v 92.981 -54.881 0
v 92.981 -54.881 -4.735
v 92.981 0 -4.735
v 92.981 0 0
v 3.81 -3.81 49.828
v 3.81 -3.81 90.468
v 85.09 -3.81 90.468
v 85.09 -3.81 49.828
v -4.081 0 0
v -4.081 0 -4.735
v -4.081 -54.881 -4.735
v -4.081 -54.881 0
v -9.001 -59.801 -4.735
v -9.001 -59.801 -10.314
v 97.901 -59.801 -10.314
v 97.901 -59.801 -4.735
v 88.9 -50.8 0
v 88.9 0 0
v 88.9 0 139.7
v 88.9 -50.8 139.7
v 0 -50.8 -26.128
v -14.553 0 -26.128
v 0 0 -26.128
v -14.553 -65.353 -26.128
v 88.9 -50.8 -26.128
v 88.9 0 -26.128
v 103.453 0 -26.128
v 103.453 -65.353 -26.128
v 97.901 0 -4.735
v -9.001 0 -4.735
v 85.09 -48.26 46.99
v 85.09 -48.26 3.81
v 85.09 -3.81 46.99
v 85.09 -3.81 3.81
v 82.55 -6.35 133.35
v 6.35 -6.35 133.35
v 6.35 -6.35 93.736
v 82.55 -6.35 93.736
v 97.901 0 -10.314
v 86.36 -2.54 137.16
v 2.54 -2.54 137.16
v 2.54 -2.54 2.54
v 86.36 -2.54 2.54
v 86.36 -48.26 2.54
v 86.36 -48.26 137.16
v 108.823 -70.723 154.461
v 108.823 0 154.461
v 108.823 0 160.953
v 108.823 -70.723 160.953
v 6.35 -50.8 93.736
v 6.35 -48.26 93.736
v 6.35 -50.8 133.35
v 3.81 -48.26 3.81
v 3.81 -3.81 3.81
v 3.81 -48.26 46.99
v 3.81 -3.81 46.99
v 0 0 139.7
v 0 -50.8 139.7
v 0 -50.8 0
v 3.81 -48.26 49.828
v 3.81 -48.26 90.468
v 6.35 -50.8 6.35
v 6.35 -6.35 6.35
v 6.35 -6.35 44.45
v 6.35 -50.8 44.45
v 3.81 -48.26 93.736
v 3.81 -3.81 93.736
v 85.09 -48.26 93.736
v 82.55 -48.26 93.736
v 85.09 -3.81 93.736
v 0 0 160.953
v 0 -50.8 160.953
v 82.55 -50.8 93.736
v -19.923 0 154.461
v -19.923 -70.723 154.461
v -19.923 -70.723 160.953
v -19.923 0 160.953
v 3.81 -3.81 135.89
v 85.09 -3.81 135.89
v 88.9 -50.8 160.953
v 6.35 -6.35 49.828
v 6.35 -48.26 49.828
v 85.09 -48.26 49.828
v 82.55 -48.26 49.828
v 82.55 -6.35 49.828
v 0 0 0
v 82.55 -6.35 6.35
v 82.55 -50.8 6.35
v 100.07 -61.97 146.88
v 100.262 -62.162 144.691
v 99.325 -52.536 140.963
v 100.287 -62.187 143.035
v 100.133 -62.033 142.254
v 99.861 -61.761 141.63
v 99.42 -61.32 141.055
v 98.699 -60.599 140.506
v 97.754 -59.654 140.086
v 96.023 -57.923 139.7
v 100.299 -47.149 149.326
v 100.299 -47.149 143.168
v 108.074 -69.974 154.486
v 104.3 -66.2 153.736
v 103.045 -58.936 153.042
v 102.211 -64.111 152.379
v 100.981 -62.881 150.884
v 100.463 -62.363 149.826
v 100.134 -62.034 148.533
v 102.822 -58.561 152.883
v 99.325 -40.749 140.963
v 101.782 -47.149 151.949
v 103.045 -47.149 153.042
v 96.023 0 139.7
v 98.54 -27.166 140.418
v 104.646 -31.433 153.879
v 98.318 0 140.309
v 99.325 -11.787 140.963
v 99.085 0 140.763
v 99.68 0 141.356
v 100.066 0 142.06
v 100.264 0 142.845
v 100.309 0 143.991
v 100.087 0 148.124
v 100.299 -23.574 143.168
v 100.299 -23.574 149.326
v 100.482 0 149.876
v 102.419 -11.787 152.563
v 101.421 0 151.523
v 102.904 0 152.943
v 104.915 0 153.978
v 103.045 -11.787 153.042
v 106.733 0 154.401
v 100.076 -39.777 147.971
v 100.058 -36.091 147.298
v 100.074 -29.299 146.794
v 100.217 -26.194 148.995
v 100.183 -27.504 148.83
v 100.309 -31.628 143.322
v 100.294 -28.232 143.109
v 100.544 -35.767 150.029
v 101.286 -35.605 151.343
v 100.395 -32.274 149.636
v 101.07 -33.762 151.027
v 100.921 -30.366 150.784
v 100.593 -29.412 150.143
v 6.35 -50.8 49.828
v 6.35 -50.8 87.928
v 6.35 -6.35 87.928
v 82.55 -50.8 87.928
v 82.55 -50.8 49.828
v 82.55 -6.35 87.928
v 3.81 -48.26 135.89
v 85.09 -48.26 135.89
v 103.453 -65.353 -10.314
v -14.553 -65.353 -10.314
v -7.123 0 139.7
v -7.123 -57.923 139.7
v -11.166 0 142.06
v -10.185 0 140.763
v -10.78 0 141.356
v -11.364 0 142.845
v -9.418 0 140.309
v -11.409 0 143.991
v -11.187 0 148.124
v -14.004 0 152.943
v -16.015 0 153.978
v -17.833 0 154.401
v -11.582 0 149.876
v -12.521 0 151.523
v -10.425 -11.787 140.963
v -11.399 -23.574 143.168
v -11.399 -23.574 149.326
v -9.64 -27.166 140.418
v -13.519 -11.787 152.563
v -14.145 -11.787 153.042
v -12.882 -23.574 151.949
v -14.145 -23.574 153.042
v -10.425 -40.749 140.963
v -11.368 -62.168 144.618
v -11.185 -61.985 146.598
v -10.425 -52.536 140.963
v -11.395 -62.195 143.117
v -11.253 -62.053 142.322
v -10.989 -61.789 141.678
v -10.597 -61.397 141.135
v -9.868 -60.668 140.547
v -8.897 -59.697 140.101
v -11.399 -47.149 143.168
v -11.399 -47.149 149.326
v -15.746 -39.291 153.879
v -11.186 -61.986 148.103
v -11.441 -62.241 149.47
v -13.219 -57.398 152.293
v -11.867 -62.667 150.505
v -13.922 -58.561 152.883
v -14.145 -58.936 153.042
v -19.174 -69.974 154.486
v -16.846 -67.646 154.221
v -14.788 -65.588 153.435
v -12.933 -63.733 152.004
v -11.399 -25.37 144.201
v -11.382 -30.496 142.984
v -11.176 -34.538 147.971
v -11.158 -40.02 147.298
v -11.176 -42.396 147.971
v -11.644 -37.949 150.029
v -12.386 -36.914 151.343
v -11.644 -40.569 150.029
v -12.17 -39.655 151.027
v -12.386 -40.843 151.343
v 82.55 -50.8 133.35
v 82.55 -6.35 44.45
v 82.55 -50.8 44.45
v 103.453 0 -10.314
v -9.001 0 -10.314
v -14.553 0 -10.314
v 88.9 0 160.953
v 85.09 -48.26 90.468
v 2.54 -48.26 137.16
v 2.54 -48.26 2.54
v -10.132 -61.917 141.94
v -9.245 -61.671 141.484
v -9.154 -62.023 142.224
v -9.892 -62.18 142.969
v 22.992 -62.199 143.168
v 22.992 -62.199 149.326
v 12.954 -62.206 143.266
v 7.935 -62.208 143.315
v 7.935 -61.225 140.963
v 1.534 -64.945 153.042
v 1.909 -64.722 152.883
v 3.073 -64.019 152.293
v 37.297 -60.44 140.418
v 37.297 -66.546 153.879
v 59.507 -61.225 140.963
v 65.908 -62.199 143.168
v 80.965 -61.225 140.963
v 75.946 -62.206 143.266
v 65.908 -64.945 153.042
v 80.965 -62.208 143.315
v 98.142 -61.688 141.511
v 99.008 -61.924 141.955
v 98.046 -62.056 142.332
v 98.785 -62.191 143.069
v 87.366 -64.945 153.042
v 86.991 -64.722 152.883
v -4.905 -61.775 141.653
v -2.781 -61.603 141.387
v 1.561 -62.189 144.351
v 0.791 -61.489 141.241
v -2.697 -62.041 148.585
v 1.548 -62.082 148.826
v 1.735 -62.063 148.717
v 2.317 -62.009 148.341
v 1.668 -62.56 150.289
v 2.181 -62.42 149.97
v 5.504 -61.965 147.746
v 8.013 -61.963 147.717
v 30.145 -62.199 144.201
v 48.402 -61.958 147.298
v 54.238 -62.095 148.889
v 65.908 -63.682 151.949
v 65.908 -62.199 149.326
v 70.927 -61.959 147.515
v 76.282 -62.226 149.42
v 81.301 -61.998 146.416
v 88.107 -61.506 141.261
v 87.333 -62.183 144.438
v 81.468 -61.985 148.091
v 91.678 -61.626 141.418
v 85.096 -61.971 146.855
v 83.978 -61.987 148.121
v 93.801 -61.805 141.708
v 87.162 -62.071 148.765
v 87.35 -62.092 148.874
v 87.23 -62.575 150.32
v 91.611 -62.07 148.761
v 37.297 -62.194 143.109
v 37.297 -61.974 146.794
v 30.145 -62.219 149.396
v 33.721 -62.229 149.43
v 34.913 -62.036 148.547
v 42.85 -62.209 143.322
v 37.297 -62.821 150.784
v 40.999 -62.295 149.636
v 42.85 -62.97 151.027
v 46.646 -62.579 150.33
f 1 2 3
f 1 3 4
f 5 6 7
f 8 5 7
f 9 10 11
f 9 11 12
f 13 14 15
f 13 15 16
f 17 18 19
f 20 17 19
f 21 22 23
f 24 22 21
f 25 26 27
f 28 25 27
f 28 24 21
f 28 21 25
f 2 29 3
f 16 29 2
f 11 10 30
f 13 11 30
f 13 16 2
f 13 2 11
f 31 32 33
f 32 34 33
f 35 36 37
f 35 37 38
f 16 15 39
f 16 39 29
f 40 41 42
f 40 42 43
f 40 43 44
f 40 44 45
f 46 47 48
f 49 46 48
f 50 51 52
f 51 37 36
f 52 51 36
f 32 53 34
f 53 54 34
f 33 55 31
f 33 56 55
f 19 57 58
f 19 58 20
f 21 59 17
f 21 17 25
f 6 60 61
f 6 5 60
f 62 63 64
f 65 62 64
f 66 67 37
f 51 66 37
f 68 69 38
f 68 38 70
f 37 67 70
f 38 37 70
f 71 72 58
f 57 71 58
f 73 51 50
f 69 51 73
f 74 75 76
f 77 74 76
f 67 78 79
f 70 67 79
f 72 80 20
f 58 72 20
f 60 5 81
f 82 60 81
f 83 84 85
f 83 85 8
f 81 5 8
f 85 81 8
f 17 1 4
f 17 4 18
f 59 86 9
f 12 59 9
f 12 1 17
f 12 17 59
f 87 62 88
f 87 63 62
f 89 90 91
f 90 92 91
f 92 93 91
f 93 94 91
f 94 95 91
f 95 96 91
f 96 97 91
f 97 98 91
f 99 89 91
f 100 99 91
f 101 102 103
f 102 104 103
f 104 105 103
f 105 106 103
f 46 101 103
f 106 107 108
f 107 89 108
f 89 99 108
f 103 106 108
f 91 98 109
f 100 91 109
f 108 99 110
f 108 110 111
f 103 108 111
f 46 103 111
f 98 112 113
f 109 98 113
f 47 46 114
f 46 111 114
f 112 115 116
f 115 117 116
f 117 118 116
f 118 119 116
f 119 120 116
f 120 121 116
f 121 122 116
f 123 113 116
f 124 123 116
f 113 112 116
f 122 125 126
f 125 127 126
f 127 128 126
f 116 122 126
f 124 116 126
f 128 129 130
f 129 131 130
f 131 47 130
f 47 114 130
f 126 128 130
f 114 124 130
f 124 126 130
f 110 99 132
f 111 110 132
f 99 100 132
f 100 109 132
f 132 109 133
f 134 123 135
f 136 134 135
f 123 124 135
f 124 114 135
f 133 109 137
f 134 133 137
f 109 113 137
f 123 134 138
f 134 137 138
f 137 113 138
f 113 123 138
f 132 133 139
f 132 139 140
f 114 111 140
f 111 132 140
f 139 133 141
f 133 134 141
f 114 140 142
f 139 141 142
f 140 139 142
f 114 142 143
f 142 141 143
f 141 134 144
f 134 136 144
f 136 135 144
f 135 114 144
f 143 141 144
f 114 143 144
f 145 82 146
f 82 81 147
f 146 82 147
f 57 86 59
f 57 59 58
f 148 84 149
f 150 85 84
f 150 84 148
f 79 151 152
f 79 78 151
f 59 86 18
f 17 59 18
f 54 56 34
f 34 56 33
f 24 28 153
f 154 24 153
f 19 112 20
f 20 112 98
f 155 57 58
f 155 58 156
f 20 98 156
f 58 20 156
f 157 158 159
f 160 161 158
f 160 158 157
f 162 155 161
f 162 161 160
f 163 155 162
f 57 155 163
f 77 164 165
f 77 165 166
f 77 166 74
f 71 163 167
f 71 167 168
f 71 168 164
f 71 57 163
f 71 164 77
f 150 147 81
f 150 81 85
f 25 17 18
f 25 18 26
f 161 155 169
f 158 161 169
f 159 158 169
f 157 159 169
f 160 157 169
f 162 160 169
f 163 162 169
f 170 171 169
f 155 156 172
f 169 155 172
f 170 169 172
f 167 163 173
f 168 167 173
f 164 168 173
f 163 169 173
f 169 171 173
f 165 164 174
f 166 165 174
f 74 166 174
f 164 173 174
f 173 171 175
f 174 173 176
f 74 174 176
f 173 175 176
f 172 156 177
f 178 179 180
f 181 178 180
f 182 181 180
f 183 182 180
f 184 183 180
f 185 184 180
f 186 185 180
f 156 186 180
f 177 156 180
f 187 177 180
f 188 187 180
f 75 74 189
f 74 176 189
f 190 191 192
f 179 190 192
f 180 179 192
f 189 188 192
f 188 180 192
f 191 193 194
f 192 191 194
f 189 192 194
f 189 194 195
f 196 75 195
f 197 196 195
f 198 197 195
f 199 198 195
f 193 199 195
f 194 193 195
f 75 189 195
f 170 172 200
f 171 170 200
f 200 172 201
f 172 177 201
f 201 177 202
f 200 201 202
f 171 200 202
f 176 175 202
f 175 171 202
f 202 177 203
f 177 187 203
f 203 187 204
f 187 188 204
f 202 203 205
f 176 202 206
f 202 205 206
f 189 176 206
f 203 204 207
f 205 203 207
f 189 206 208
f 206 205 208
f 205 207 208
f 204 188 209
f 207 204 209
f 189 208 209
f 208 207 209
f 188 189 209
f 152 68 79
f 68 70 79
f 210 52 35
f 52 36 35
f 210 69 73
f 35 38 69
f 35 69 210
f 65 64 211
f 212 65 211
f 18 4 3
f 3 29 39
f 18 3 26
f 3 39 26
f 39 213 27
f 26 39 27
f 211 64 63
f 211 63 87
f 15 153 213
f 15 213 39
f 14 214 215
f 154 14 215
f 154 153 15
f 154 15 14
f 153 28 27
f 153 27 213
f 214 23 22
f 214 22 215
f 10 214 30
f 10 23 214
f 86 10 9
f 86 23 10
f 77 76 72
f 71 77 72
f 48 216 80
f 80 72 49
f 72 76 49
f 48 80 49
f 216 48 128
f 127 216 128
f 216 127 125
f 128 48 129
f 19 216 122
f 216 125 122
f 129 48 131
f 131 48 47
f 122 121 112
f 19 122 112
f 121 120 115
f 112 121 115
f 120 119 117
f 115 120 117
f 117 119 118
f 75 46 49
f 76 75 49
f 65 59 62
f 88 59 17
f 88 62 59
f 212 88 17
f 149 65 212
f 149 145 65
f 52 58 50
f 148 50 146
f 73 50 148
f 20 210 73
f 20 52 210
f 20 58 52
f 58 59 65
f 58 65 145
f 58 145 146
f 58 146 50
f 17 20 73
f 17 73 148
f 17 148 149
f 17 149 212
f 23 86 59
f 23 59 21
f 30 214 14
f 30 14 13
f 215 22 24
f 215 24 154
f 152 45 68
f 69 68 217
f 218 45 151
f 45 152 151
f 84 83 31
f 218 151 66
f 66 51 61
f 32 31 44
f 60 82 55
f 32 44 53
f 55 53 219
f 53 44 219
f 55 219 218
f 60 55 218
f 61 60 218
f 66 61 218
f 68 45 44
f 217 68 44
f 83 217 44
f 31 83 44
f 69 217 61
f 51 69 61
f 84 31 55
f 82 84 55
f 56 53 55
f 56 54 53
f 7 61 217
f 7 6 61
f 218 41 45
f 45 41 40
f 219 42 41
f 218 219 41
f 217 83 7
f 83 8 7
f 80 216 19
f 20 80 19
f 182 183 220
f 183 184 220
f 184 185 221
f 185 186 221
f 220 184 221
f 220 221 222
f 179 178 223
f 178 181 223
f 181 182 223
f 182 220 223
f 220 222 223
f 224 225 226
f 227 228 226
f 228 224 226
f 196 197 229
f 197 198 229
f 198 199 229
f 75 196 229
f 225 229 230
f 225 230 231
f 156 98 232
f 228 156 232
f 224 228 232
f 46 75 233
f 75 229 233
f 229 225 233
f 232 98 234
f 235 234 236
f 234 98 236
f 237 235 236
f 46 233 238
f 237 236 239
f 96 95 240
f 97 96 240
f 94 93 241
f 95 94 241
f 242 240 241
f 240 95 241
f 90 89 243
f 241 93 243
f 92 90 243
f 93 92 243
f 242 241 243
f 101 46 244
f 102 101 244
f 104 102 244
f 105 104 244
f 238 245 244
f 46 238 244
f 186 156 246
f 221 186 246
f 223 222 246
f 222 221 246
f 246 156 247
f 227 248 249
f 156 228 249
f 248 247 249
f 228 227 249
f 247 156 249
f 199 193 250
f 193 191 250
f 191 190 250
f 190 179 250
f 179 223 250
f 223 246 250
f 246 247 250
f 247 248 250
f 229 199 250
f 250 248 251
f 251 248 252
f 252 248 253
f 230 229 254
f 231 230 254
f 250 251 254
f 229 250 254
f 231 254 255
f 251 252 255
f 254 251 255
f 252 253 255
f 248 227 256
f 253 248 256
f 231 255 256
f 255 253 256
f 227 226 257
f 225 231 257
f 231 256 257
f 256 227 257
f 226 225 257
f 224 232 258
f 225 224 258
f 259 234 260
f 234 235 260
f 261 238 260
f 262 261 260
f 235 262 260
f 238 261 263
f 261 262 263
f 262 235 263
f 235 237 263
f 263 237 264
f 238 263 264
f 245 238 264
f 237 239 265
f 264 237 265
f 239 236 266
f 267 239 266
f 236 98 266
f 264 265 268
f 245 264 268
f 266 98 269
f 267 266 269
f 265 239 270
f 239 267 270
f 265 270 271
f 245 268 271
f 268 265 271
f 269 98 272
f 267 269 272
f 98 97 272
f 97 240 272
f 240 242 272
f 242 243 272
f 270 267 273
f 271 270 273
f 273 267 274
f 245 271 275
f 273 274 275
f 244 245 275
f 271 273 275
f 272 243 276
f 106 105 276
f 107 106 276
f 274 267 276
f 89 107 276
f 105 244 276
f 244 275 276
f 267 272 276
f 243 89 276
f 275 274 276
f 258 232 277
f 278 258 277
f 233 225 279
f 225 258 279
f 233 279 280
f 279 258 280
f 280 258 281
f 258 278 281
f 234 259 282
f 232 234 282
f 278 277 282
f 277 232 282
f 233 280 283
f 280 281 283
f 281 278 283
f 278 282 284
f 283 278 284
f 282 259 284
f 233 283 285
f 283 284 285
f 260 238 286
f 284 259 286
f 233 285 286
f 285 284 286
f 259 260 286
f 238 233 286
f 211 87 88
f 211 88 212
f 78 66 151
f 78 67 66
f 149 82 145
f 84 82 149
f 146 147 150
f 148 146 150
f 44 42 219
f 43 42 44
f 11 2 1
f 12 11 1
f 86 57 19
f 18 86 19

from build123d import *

# Parameters (mm, degrees)
F0_W      = 88.9
F0_H      = 139.7
F1_DEPTH  = 50.8
F2_T      = -6.35
F9_W      = 76.2
F9_H      = 5.8078249037
F9_H_2    = 5.3777060688
F10_DEPTH = 44.45
F11_T     = -2.54


# Not quite as in the source:
# - a shell that OpenCascade refuses in one call is made with other operations: the cavity is built on its own and cut out


with BuildPart() as f1:
    # F0 (on Front) → F1 (new body)
    with BuildSketch(Plane.XZ):
        with Locations((44.45, 69.85)):
            Rectangle(F0_W, F0_H)
    extrude(amount=F1_DEPTH)

    # F2
    f2_openings = [f1.faces().sort_by_distance(p)[0] for p in [
        (44.45, -50.8, 69.85),
    ]]
    offset(amount=F2_T, openings=f2_openings)

    # F9 (on face) → F10 (join)
    with BuildSketch(Plane.XZ.offset(6.35)):
        with Locations((44.45, 90.8316185206)):
            Rectangle(F9_W, F9_H)
        with Locations((44.45, 47.1388530344)):
            Rectangle(F9_W, F9_H_2)
    extrude(amount=F10_DEPTH)

    # F11: a shell. OpenCascade refuses it in one call, so the cavity is built on its own and cut out:
    # the body offset inwards by the wall thickness, plus a prism from it out through each open face.
    f11_core = offset(f1.part, amount=F11_T, kind=Kind.INTERSECTION, mode=Mode.PRIVATE)
    f11_exits = [f11_core.faces().sort_by_distance(p)[0] for p in [
        (44.45, -26.035, 91.195531),
        (44.45, -26.035, 47.287706),
    ]]
    add(f11_core, mode=Mode.SUBTRACT)
    extrude(f11_exits, amount=-F11_T, mode=Mode.SUBTRACT)


with BuildPart() as f5:
    # F5: sweep along a path in F3
    with BuildLine(Plane.XY.offset(139.7)) as f5_path:
        Line((0, 0), (0, -50.8))
        Line((0, -50.8), (88.9, -50.8))
        Line((88.9, -50.8), (88.9, 0))
    # F4 (on face) → F5 (sweep)
    with BuildSketch(Plane(origin=(0, 0, 0), x_dir=(-1, 0, 0), z_dir=(0, 1, 0))):
        with BuildLine():
            Line((0, 160.9531491995), (0, 139.7))
            Line((0, 139.7), (7.1226162836, 139.7))
            add(Edge.make_bspline(
                [(19.9233293533, 154.4612050056), (15.1122931258, 154.7714925538), (9.8517459293, 149.9580939303), (12.2362864635, 142.8802470964), (10.3562465476, 140.1408824591), (7.1226162836, 139.7)],
                knots=[0, 0, 0, 0, 0.3951929402, 0.7060594336, 1, 1, 1, 1], degree=3))
            Line((19.9233293533, 154.4612050056), (19.9233293533, 160.9531491995))
            Line((19.9233293533, 160.9531491995), (0, 160.9531491995))
        make_face()
    sweep(path=f5_path.line, transition=Transition.RIGHT)


with BuildPart() as f8:
    # F8: sweep along a path in F6
    with BuildLine(Plane(origin=(0, 0, 0), x_dir=(1, 0, 0), z_dir=(0, 0, -1))) as f8_path:
        Line((88.9, 0), (88.9, 50.8))
        Line((88.9, 50.8), (0, 50.8))
        Line((0, 50.8), (0, 0))
    # F7 (on face) → F8 (sweep)
    with BuildSketch(Plane(origin=(0, 0, 0), x_dir=(-1, 0, 0), z_dir=(0, 1, 0))):
        Polygon((4.080534447, 0), (0, 0), (0, -26.1282473803), (14.5531892776, -26.1282473803), (14.5531892776, -14.4312130287), (14.5531892776, -10.3144859895), (9.0009085834, -10.3144859895), (9.0009085834, -4.7345655039), (4.080534447, -4.7345655039), align=None)
    sweep(path=f8_path.line, transition=Transition.RIGHT)


solid = Compound([f1.part, f5.part, f8.part])
